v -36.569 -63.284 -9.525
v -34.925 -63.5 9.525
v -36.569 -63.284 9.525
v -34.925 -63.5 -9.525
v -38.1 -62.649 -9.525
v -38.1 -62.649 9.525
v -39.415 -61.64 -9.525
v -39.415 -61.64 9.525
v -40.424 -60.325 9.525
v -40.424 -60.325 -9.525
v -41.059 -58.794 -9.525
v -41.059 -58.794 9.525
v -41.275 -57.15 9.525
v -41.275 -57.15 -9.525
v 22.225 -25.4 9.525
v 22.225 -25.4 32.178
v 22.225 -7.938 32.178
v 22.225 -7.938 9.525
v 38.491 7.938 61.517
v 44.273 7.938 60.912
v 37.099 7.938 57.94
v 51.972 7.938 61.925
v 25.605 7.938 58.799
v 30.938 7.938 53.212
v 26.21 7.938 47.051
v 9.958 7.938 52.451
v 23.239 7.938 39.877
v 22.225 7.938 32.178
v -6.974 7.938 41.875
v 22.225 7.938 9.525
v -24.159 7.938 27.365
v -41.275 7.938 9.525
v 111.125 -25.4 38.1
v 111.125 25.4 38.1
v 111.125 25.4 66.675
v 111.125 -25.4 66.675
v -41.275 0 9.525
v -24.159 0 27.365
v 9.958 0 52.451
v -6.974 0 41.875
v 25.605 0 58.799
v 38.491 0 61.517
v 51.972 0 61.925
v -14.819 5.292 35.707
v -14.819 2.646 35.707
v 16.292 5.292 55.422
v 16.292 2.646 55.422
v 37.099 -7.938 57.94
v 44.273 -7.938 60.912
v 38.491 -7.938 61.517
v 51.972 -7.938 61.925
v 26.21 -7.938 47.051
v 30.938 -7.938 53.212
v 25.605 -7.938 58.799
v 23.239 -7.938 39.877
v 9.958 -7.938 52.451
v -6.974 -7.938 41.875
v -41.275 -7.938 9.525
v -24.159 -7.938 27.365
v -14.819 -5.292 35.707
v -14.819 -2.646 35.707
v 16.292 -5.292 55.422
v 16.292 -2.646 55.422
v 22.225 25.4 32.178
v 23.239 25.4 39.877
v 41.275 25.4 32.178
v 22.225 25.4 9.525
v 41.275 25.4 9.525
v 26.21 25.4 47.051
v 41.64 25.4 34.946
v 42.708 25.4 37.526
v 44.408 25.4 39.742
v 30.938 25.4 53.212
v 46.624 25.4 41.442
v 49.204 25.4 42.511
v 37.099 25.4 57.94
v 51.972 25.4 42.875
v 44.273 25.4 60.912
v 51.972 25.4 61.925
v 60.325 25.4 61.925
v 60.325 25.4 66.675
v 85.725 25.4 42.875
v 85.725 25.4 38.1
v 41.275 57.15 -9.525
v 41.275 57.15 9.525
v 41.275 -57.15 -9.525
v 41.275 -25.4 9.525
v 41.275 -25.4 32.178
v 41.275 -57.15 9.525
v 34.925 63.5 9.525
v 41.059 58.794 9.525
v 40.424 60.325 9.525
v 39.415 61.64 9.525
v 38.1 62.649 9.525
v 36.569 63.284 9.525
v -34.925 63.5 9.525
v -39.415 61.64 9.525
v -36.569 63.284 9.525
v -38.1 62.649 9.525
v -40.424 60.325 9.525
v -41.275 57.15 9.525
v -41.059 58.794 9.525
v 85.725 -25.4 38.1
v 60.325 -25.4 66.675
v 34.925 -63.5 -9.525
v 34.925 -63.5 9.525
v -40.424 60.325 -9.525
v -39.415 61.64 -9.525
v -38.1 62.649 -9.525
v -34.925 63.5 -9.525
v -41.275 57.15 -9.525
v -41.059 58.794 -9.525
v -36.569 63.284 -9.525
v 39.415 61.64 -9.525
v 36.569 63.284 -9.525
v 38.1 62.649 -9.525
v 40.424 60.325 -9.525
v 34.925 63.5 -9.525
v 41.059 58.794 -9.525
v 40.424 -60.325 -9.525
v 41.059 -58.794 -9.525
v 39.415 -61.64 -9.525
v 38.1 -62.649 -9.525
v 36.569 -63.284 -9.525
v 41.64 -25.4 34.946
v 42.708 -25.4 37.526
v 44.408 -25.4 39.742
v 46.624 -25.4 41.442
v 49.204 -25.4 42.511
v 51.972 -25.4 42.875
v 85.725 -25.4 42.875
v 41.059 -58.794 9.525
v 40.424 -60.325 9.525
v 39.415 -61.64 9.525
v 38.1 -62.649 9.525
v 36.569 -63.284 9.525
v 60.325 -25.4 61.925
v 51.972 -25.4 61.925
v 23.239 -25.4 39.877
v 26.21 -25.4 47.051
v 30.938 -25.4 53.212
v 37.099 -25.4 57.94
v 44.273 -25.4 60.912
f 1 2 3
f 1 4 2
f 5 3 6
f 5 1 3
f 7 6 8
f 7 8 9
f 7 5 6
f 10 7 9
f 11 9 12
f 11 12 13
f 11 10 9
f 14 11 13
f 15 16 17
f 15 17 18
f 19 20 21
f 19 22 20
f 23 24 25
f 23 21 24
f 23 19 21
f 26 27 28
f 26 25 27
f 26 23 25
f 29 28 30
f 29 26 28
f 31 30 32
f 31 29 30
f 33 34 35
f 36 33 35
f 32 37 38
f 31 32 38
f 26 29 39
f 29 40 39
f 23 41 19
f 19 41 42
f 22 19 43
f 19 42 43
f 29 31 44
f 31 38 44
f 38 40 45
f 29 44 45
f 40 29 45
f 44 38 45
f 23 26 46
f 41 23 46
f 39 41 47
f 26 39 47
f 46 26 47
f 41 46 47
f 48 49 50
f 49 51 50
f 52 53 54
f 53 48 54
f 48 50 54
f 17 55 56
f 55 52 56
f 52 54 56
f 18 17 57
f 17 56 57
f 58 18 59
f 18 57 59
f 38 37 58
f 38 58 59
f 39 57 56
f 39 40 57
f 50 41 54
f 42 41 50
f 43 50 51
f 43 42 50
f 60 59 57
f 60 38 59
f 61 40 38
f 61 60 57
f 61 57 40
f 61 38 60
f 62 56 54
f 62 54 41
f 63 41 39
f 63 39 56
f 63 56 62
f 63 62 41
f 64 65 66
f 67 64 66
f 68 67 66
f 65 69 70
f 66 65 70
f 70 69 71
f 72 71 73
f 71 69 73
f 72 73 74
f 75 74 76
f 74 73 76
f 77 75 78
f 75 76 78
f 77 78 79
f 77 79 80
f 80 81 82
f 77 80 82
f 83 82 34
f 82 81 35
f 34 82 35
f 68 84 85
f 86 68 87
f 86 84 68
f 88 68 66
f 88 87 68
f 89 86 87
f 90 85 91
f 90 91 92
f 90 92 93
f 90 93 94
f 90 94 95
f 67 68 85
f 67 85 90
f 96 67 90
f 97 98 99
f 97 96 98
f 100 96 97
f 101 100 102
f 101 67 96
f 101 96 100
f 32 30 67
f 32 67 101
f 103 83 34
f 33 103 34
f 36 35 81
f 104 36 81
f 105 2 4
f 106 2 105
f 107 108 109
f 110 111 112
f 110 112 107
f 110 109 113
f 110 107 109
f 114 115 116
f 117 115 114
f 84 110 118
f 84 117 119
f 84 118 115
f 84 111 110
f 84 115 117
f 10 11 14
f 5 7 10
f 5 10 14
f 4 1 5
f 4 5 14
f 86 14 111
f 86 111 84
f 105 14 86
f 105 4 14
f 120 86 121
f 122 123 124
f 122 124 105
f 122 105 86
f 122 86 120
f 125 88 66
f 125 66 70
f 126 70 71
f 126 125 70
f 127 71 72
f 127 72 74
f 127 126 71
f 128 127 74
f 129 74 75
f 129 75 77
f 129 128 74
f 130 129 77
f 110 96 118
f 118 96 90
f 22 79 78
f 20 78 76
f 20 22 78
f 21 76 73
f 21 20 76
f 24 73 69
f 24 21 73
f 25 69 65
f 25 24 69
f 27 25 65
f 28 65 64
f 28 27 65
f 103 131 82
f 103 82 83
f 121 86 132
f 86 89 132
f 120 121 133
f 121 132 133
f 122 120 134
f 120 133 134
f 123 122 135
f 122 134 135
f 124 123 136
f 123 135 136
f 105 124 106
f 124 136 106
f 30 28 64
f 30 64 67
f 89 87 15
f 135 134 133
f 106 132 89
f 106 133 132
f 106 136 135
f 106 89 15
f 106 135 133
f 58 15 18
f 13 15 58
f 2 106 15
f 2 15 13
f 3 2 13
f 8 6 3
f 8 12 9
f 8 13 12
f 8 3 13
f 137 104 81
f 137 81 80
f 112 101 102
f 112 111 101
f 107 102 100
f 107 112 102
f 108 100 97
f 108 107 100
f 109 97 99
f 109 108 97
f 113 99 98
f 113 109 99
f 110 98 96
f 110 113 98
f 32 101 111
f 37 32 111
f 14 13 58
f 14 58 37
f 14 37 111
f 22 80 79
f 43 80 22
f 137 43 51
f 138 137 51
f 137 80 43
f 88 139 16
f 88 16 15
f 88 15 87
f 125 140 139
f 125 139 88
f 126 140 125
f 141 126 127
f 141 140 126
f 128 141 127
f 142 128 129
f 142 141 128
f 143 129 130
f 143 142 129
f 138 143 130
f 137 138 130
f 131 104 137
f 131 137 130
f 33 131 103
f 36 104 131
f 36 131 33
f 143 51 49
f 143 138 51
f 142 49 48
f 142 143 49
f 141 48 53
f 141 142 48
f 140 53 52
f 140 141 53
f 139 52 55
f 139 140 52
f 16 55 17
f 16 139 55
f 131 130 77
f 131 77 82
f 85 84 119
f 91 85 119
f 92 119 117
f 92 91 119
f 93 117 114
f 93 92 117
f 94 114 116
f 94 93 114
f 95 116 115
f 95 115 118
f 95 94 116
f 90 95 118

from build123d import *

# Parameters (mm, degrees)
F1_DEPTH = 63.5
F2_DEPTH = 25.4
F3_DEPTH = 7.9375
F4_DEPTH = 25.4
F5_R     = 6.35


with BuildPart() as f1:
    # F0 (on Front) → F1 (new body, symmetric)
    with BuildSketch(Plane.XZ):
        Polygon((22.225, 9.525), (-41.275, 9.525), (-41.275, -9.525), (41.275, -9.525), (41.275, 9.525), align=None)
    extrude(amount=F1_DEPTH, both=True)

    # F0 (on Front) → F2 (join, symmetric)
    with BuildSketch(Plane.XZ):
        with BuildLine():
            Line((22.225, 32.177767), (22.225, 9.525))
            Line((22.225, 9.525), (41.275, 9.525))
            Line((41.275, 9.525), (41.275, 32.177767))
            ThreePointArc((41.275, 32.177767), (44.408206, 39.741994), (51.972433, 42.8752))
            Line((51.972433, 42.8752), (60.325, 42.8752))
            Line((60.325, 42.8752), (60.325, 61.9252))
            Line((60.325, 61.9252), (51.972433, 61.9252))
            ThreePointArc((51.972433, 61.9252), (30.937821, 53.212379), (22.225, 32.177767))
        make_face()
        Polygon((60.325, 66.675), (60.325, 61.9252), (60.325, 42.8752), (85.725, 42.8752), (85.725, 66.675), align=None)
    extrude(amount=F2_DEPTH, both=True)

    # F0 (on Front) → F3 (join, symmetric)
    with BuildSketch(Plane.XZ):
        with BuildLine():
            add(Edge.make_bspline(
                [(-41.275, 9.525), (-17.174726, 36.691695), (14.035416, 64.275697), (51.972433, 61.9252)],
                knots=[0, 0, 0, 0, 106.961978, 106.961978, 106.961978, 106.961978], degree=3))
            Line((-41.275, 9.525), (22.225, 9.525))
            Line((22.225, 9.525), (22.225, 32.177767))
            ThreePointArc((22.225, 32.177767), (30.937821, 53.212379), (51.972433, 61.9252))
        make_face()
    extrude(amount=F3_DEPTH, both=True)

    # F0 (on Front) → F4 (join, symmetric)
    with BuildSketch(Plane.XZ):
        Polygon((111.125, 66.675), (85.725, 66.675), (85.725, 42.8752), (85.725, 38.1), (111.125, 38.1), align=None)
    extrude(amount=F4_DEPTH, both=True)

    # F5
    f5_edges = [f1.edges().sort_by_distance(p)[0] for p in [
        (-41.275, -63.5, 0),
        (41.275, -63.5, 0),
        (-41.275, 63.5, 0),
        (41.275, 63.5, 0),
    ]]
    fillet(f5_edges, radius=F5_R)


solid = f1.part
